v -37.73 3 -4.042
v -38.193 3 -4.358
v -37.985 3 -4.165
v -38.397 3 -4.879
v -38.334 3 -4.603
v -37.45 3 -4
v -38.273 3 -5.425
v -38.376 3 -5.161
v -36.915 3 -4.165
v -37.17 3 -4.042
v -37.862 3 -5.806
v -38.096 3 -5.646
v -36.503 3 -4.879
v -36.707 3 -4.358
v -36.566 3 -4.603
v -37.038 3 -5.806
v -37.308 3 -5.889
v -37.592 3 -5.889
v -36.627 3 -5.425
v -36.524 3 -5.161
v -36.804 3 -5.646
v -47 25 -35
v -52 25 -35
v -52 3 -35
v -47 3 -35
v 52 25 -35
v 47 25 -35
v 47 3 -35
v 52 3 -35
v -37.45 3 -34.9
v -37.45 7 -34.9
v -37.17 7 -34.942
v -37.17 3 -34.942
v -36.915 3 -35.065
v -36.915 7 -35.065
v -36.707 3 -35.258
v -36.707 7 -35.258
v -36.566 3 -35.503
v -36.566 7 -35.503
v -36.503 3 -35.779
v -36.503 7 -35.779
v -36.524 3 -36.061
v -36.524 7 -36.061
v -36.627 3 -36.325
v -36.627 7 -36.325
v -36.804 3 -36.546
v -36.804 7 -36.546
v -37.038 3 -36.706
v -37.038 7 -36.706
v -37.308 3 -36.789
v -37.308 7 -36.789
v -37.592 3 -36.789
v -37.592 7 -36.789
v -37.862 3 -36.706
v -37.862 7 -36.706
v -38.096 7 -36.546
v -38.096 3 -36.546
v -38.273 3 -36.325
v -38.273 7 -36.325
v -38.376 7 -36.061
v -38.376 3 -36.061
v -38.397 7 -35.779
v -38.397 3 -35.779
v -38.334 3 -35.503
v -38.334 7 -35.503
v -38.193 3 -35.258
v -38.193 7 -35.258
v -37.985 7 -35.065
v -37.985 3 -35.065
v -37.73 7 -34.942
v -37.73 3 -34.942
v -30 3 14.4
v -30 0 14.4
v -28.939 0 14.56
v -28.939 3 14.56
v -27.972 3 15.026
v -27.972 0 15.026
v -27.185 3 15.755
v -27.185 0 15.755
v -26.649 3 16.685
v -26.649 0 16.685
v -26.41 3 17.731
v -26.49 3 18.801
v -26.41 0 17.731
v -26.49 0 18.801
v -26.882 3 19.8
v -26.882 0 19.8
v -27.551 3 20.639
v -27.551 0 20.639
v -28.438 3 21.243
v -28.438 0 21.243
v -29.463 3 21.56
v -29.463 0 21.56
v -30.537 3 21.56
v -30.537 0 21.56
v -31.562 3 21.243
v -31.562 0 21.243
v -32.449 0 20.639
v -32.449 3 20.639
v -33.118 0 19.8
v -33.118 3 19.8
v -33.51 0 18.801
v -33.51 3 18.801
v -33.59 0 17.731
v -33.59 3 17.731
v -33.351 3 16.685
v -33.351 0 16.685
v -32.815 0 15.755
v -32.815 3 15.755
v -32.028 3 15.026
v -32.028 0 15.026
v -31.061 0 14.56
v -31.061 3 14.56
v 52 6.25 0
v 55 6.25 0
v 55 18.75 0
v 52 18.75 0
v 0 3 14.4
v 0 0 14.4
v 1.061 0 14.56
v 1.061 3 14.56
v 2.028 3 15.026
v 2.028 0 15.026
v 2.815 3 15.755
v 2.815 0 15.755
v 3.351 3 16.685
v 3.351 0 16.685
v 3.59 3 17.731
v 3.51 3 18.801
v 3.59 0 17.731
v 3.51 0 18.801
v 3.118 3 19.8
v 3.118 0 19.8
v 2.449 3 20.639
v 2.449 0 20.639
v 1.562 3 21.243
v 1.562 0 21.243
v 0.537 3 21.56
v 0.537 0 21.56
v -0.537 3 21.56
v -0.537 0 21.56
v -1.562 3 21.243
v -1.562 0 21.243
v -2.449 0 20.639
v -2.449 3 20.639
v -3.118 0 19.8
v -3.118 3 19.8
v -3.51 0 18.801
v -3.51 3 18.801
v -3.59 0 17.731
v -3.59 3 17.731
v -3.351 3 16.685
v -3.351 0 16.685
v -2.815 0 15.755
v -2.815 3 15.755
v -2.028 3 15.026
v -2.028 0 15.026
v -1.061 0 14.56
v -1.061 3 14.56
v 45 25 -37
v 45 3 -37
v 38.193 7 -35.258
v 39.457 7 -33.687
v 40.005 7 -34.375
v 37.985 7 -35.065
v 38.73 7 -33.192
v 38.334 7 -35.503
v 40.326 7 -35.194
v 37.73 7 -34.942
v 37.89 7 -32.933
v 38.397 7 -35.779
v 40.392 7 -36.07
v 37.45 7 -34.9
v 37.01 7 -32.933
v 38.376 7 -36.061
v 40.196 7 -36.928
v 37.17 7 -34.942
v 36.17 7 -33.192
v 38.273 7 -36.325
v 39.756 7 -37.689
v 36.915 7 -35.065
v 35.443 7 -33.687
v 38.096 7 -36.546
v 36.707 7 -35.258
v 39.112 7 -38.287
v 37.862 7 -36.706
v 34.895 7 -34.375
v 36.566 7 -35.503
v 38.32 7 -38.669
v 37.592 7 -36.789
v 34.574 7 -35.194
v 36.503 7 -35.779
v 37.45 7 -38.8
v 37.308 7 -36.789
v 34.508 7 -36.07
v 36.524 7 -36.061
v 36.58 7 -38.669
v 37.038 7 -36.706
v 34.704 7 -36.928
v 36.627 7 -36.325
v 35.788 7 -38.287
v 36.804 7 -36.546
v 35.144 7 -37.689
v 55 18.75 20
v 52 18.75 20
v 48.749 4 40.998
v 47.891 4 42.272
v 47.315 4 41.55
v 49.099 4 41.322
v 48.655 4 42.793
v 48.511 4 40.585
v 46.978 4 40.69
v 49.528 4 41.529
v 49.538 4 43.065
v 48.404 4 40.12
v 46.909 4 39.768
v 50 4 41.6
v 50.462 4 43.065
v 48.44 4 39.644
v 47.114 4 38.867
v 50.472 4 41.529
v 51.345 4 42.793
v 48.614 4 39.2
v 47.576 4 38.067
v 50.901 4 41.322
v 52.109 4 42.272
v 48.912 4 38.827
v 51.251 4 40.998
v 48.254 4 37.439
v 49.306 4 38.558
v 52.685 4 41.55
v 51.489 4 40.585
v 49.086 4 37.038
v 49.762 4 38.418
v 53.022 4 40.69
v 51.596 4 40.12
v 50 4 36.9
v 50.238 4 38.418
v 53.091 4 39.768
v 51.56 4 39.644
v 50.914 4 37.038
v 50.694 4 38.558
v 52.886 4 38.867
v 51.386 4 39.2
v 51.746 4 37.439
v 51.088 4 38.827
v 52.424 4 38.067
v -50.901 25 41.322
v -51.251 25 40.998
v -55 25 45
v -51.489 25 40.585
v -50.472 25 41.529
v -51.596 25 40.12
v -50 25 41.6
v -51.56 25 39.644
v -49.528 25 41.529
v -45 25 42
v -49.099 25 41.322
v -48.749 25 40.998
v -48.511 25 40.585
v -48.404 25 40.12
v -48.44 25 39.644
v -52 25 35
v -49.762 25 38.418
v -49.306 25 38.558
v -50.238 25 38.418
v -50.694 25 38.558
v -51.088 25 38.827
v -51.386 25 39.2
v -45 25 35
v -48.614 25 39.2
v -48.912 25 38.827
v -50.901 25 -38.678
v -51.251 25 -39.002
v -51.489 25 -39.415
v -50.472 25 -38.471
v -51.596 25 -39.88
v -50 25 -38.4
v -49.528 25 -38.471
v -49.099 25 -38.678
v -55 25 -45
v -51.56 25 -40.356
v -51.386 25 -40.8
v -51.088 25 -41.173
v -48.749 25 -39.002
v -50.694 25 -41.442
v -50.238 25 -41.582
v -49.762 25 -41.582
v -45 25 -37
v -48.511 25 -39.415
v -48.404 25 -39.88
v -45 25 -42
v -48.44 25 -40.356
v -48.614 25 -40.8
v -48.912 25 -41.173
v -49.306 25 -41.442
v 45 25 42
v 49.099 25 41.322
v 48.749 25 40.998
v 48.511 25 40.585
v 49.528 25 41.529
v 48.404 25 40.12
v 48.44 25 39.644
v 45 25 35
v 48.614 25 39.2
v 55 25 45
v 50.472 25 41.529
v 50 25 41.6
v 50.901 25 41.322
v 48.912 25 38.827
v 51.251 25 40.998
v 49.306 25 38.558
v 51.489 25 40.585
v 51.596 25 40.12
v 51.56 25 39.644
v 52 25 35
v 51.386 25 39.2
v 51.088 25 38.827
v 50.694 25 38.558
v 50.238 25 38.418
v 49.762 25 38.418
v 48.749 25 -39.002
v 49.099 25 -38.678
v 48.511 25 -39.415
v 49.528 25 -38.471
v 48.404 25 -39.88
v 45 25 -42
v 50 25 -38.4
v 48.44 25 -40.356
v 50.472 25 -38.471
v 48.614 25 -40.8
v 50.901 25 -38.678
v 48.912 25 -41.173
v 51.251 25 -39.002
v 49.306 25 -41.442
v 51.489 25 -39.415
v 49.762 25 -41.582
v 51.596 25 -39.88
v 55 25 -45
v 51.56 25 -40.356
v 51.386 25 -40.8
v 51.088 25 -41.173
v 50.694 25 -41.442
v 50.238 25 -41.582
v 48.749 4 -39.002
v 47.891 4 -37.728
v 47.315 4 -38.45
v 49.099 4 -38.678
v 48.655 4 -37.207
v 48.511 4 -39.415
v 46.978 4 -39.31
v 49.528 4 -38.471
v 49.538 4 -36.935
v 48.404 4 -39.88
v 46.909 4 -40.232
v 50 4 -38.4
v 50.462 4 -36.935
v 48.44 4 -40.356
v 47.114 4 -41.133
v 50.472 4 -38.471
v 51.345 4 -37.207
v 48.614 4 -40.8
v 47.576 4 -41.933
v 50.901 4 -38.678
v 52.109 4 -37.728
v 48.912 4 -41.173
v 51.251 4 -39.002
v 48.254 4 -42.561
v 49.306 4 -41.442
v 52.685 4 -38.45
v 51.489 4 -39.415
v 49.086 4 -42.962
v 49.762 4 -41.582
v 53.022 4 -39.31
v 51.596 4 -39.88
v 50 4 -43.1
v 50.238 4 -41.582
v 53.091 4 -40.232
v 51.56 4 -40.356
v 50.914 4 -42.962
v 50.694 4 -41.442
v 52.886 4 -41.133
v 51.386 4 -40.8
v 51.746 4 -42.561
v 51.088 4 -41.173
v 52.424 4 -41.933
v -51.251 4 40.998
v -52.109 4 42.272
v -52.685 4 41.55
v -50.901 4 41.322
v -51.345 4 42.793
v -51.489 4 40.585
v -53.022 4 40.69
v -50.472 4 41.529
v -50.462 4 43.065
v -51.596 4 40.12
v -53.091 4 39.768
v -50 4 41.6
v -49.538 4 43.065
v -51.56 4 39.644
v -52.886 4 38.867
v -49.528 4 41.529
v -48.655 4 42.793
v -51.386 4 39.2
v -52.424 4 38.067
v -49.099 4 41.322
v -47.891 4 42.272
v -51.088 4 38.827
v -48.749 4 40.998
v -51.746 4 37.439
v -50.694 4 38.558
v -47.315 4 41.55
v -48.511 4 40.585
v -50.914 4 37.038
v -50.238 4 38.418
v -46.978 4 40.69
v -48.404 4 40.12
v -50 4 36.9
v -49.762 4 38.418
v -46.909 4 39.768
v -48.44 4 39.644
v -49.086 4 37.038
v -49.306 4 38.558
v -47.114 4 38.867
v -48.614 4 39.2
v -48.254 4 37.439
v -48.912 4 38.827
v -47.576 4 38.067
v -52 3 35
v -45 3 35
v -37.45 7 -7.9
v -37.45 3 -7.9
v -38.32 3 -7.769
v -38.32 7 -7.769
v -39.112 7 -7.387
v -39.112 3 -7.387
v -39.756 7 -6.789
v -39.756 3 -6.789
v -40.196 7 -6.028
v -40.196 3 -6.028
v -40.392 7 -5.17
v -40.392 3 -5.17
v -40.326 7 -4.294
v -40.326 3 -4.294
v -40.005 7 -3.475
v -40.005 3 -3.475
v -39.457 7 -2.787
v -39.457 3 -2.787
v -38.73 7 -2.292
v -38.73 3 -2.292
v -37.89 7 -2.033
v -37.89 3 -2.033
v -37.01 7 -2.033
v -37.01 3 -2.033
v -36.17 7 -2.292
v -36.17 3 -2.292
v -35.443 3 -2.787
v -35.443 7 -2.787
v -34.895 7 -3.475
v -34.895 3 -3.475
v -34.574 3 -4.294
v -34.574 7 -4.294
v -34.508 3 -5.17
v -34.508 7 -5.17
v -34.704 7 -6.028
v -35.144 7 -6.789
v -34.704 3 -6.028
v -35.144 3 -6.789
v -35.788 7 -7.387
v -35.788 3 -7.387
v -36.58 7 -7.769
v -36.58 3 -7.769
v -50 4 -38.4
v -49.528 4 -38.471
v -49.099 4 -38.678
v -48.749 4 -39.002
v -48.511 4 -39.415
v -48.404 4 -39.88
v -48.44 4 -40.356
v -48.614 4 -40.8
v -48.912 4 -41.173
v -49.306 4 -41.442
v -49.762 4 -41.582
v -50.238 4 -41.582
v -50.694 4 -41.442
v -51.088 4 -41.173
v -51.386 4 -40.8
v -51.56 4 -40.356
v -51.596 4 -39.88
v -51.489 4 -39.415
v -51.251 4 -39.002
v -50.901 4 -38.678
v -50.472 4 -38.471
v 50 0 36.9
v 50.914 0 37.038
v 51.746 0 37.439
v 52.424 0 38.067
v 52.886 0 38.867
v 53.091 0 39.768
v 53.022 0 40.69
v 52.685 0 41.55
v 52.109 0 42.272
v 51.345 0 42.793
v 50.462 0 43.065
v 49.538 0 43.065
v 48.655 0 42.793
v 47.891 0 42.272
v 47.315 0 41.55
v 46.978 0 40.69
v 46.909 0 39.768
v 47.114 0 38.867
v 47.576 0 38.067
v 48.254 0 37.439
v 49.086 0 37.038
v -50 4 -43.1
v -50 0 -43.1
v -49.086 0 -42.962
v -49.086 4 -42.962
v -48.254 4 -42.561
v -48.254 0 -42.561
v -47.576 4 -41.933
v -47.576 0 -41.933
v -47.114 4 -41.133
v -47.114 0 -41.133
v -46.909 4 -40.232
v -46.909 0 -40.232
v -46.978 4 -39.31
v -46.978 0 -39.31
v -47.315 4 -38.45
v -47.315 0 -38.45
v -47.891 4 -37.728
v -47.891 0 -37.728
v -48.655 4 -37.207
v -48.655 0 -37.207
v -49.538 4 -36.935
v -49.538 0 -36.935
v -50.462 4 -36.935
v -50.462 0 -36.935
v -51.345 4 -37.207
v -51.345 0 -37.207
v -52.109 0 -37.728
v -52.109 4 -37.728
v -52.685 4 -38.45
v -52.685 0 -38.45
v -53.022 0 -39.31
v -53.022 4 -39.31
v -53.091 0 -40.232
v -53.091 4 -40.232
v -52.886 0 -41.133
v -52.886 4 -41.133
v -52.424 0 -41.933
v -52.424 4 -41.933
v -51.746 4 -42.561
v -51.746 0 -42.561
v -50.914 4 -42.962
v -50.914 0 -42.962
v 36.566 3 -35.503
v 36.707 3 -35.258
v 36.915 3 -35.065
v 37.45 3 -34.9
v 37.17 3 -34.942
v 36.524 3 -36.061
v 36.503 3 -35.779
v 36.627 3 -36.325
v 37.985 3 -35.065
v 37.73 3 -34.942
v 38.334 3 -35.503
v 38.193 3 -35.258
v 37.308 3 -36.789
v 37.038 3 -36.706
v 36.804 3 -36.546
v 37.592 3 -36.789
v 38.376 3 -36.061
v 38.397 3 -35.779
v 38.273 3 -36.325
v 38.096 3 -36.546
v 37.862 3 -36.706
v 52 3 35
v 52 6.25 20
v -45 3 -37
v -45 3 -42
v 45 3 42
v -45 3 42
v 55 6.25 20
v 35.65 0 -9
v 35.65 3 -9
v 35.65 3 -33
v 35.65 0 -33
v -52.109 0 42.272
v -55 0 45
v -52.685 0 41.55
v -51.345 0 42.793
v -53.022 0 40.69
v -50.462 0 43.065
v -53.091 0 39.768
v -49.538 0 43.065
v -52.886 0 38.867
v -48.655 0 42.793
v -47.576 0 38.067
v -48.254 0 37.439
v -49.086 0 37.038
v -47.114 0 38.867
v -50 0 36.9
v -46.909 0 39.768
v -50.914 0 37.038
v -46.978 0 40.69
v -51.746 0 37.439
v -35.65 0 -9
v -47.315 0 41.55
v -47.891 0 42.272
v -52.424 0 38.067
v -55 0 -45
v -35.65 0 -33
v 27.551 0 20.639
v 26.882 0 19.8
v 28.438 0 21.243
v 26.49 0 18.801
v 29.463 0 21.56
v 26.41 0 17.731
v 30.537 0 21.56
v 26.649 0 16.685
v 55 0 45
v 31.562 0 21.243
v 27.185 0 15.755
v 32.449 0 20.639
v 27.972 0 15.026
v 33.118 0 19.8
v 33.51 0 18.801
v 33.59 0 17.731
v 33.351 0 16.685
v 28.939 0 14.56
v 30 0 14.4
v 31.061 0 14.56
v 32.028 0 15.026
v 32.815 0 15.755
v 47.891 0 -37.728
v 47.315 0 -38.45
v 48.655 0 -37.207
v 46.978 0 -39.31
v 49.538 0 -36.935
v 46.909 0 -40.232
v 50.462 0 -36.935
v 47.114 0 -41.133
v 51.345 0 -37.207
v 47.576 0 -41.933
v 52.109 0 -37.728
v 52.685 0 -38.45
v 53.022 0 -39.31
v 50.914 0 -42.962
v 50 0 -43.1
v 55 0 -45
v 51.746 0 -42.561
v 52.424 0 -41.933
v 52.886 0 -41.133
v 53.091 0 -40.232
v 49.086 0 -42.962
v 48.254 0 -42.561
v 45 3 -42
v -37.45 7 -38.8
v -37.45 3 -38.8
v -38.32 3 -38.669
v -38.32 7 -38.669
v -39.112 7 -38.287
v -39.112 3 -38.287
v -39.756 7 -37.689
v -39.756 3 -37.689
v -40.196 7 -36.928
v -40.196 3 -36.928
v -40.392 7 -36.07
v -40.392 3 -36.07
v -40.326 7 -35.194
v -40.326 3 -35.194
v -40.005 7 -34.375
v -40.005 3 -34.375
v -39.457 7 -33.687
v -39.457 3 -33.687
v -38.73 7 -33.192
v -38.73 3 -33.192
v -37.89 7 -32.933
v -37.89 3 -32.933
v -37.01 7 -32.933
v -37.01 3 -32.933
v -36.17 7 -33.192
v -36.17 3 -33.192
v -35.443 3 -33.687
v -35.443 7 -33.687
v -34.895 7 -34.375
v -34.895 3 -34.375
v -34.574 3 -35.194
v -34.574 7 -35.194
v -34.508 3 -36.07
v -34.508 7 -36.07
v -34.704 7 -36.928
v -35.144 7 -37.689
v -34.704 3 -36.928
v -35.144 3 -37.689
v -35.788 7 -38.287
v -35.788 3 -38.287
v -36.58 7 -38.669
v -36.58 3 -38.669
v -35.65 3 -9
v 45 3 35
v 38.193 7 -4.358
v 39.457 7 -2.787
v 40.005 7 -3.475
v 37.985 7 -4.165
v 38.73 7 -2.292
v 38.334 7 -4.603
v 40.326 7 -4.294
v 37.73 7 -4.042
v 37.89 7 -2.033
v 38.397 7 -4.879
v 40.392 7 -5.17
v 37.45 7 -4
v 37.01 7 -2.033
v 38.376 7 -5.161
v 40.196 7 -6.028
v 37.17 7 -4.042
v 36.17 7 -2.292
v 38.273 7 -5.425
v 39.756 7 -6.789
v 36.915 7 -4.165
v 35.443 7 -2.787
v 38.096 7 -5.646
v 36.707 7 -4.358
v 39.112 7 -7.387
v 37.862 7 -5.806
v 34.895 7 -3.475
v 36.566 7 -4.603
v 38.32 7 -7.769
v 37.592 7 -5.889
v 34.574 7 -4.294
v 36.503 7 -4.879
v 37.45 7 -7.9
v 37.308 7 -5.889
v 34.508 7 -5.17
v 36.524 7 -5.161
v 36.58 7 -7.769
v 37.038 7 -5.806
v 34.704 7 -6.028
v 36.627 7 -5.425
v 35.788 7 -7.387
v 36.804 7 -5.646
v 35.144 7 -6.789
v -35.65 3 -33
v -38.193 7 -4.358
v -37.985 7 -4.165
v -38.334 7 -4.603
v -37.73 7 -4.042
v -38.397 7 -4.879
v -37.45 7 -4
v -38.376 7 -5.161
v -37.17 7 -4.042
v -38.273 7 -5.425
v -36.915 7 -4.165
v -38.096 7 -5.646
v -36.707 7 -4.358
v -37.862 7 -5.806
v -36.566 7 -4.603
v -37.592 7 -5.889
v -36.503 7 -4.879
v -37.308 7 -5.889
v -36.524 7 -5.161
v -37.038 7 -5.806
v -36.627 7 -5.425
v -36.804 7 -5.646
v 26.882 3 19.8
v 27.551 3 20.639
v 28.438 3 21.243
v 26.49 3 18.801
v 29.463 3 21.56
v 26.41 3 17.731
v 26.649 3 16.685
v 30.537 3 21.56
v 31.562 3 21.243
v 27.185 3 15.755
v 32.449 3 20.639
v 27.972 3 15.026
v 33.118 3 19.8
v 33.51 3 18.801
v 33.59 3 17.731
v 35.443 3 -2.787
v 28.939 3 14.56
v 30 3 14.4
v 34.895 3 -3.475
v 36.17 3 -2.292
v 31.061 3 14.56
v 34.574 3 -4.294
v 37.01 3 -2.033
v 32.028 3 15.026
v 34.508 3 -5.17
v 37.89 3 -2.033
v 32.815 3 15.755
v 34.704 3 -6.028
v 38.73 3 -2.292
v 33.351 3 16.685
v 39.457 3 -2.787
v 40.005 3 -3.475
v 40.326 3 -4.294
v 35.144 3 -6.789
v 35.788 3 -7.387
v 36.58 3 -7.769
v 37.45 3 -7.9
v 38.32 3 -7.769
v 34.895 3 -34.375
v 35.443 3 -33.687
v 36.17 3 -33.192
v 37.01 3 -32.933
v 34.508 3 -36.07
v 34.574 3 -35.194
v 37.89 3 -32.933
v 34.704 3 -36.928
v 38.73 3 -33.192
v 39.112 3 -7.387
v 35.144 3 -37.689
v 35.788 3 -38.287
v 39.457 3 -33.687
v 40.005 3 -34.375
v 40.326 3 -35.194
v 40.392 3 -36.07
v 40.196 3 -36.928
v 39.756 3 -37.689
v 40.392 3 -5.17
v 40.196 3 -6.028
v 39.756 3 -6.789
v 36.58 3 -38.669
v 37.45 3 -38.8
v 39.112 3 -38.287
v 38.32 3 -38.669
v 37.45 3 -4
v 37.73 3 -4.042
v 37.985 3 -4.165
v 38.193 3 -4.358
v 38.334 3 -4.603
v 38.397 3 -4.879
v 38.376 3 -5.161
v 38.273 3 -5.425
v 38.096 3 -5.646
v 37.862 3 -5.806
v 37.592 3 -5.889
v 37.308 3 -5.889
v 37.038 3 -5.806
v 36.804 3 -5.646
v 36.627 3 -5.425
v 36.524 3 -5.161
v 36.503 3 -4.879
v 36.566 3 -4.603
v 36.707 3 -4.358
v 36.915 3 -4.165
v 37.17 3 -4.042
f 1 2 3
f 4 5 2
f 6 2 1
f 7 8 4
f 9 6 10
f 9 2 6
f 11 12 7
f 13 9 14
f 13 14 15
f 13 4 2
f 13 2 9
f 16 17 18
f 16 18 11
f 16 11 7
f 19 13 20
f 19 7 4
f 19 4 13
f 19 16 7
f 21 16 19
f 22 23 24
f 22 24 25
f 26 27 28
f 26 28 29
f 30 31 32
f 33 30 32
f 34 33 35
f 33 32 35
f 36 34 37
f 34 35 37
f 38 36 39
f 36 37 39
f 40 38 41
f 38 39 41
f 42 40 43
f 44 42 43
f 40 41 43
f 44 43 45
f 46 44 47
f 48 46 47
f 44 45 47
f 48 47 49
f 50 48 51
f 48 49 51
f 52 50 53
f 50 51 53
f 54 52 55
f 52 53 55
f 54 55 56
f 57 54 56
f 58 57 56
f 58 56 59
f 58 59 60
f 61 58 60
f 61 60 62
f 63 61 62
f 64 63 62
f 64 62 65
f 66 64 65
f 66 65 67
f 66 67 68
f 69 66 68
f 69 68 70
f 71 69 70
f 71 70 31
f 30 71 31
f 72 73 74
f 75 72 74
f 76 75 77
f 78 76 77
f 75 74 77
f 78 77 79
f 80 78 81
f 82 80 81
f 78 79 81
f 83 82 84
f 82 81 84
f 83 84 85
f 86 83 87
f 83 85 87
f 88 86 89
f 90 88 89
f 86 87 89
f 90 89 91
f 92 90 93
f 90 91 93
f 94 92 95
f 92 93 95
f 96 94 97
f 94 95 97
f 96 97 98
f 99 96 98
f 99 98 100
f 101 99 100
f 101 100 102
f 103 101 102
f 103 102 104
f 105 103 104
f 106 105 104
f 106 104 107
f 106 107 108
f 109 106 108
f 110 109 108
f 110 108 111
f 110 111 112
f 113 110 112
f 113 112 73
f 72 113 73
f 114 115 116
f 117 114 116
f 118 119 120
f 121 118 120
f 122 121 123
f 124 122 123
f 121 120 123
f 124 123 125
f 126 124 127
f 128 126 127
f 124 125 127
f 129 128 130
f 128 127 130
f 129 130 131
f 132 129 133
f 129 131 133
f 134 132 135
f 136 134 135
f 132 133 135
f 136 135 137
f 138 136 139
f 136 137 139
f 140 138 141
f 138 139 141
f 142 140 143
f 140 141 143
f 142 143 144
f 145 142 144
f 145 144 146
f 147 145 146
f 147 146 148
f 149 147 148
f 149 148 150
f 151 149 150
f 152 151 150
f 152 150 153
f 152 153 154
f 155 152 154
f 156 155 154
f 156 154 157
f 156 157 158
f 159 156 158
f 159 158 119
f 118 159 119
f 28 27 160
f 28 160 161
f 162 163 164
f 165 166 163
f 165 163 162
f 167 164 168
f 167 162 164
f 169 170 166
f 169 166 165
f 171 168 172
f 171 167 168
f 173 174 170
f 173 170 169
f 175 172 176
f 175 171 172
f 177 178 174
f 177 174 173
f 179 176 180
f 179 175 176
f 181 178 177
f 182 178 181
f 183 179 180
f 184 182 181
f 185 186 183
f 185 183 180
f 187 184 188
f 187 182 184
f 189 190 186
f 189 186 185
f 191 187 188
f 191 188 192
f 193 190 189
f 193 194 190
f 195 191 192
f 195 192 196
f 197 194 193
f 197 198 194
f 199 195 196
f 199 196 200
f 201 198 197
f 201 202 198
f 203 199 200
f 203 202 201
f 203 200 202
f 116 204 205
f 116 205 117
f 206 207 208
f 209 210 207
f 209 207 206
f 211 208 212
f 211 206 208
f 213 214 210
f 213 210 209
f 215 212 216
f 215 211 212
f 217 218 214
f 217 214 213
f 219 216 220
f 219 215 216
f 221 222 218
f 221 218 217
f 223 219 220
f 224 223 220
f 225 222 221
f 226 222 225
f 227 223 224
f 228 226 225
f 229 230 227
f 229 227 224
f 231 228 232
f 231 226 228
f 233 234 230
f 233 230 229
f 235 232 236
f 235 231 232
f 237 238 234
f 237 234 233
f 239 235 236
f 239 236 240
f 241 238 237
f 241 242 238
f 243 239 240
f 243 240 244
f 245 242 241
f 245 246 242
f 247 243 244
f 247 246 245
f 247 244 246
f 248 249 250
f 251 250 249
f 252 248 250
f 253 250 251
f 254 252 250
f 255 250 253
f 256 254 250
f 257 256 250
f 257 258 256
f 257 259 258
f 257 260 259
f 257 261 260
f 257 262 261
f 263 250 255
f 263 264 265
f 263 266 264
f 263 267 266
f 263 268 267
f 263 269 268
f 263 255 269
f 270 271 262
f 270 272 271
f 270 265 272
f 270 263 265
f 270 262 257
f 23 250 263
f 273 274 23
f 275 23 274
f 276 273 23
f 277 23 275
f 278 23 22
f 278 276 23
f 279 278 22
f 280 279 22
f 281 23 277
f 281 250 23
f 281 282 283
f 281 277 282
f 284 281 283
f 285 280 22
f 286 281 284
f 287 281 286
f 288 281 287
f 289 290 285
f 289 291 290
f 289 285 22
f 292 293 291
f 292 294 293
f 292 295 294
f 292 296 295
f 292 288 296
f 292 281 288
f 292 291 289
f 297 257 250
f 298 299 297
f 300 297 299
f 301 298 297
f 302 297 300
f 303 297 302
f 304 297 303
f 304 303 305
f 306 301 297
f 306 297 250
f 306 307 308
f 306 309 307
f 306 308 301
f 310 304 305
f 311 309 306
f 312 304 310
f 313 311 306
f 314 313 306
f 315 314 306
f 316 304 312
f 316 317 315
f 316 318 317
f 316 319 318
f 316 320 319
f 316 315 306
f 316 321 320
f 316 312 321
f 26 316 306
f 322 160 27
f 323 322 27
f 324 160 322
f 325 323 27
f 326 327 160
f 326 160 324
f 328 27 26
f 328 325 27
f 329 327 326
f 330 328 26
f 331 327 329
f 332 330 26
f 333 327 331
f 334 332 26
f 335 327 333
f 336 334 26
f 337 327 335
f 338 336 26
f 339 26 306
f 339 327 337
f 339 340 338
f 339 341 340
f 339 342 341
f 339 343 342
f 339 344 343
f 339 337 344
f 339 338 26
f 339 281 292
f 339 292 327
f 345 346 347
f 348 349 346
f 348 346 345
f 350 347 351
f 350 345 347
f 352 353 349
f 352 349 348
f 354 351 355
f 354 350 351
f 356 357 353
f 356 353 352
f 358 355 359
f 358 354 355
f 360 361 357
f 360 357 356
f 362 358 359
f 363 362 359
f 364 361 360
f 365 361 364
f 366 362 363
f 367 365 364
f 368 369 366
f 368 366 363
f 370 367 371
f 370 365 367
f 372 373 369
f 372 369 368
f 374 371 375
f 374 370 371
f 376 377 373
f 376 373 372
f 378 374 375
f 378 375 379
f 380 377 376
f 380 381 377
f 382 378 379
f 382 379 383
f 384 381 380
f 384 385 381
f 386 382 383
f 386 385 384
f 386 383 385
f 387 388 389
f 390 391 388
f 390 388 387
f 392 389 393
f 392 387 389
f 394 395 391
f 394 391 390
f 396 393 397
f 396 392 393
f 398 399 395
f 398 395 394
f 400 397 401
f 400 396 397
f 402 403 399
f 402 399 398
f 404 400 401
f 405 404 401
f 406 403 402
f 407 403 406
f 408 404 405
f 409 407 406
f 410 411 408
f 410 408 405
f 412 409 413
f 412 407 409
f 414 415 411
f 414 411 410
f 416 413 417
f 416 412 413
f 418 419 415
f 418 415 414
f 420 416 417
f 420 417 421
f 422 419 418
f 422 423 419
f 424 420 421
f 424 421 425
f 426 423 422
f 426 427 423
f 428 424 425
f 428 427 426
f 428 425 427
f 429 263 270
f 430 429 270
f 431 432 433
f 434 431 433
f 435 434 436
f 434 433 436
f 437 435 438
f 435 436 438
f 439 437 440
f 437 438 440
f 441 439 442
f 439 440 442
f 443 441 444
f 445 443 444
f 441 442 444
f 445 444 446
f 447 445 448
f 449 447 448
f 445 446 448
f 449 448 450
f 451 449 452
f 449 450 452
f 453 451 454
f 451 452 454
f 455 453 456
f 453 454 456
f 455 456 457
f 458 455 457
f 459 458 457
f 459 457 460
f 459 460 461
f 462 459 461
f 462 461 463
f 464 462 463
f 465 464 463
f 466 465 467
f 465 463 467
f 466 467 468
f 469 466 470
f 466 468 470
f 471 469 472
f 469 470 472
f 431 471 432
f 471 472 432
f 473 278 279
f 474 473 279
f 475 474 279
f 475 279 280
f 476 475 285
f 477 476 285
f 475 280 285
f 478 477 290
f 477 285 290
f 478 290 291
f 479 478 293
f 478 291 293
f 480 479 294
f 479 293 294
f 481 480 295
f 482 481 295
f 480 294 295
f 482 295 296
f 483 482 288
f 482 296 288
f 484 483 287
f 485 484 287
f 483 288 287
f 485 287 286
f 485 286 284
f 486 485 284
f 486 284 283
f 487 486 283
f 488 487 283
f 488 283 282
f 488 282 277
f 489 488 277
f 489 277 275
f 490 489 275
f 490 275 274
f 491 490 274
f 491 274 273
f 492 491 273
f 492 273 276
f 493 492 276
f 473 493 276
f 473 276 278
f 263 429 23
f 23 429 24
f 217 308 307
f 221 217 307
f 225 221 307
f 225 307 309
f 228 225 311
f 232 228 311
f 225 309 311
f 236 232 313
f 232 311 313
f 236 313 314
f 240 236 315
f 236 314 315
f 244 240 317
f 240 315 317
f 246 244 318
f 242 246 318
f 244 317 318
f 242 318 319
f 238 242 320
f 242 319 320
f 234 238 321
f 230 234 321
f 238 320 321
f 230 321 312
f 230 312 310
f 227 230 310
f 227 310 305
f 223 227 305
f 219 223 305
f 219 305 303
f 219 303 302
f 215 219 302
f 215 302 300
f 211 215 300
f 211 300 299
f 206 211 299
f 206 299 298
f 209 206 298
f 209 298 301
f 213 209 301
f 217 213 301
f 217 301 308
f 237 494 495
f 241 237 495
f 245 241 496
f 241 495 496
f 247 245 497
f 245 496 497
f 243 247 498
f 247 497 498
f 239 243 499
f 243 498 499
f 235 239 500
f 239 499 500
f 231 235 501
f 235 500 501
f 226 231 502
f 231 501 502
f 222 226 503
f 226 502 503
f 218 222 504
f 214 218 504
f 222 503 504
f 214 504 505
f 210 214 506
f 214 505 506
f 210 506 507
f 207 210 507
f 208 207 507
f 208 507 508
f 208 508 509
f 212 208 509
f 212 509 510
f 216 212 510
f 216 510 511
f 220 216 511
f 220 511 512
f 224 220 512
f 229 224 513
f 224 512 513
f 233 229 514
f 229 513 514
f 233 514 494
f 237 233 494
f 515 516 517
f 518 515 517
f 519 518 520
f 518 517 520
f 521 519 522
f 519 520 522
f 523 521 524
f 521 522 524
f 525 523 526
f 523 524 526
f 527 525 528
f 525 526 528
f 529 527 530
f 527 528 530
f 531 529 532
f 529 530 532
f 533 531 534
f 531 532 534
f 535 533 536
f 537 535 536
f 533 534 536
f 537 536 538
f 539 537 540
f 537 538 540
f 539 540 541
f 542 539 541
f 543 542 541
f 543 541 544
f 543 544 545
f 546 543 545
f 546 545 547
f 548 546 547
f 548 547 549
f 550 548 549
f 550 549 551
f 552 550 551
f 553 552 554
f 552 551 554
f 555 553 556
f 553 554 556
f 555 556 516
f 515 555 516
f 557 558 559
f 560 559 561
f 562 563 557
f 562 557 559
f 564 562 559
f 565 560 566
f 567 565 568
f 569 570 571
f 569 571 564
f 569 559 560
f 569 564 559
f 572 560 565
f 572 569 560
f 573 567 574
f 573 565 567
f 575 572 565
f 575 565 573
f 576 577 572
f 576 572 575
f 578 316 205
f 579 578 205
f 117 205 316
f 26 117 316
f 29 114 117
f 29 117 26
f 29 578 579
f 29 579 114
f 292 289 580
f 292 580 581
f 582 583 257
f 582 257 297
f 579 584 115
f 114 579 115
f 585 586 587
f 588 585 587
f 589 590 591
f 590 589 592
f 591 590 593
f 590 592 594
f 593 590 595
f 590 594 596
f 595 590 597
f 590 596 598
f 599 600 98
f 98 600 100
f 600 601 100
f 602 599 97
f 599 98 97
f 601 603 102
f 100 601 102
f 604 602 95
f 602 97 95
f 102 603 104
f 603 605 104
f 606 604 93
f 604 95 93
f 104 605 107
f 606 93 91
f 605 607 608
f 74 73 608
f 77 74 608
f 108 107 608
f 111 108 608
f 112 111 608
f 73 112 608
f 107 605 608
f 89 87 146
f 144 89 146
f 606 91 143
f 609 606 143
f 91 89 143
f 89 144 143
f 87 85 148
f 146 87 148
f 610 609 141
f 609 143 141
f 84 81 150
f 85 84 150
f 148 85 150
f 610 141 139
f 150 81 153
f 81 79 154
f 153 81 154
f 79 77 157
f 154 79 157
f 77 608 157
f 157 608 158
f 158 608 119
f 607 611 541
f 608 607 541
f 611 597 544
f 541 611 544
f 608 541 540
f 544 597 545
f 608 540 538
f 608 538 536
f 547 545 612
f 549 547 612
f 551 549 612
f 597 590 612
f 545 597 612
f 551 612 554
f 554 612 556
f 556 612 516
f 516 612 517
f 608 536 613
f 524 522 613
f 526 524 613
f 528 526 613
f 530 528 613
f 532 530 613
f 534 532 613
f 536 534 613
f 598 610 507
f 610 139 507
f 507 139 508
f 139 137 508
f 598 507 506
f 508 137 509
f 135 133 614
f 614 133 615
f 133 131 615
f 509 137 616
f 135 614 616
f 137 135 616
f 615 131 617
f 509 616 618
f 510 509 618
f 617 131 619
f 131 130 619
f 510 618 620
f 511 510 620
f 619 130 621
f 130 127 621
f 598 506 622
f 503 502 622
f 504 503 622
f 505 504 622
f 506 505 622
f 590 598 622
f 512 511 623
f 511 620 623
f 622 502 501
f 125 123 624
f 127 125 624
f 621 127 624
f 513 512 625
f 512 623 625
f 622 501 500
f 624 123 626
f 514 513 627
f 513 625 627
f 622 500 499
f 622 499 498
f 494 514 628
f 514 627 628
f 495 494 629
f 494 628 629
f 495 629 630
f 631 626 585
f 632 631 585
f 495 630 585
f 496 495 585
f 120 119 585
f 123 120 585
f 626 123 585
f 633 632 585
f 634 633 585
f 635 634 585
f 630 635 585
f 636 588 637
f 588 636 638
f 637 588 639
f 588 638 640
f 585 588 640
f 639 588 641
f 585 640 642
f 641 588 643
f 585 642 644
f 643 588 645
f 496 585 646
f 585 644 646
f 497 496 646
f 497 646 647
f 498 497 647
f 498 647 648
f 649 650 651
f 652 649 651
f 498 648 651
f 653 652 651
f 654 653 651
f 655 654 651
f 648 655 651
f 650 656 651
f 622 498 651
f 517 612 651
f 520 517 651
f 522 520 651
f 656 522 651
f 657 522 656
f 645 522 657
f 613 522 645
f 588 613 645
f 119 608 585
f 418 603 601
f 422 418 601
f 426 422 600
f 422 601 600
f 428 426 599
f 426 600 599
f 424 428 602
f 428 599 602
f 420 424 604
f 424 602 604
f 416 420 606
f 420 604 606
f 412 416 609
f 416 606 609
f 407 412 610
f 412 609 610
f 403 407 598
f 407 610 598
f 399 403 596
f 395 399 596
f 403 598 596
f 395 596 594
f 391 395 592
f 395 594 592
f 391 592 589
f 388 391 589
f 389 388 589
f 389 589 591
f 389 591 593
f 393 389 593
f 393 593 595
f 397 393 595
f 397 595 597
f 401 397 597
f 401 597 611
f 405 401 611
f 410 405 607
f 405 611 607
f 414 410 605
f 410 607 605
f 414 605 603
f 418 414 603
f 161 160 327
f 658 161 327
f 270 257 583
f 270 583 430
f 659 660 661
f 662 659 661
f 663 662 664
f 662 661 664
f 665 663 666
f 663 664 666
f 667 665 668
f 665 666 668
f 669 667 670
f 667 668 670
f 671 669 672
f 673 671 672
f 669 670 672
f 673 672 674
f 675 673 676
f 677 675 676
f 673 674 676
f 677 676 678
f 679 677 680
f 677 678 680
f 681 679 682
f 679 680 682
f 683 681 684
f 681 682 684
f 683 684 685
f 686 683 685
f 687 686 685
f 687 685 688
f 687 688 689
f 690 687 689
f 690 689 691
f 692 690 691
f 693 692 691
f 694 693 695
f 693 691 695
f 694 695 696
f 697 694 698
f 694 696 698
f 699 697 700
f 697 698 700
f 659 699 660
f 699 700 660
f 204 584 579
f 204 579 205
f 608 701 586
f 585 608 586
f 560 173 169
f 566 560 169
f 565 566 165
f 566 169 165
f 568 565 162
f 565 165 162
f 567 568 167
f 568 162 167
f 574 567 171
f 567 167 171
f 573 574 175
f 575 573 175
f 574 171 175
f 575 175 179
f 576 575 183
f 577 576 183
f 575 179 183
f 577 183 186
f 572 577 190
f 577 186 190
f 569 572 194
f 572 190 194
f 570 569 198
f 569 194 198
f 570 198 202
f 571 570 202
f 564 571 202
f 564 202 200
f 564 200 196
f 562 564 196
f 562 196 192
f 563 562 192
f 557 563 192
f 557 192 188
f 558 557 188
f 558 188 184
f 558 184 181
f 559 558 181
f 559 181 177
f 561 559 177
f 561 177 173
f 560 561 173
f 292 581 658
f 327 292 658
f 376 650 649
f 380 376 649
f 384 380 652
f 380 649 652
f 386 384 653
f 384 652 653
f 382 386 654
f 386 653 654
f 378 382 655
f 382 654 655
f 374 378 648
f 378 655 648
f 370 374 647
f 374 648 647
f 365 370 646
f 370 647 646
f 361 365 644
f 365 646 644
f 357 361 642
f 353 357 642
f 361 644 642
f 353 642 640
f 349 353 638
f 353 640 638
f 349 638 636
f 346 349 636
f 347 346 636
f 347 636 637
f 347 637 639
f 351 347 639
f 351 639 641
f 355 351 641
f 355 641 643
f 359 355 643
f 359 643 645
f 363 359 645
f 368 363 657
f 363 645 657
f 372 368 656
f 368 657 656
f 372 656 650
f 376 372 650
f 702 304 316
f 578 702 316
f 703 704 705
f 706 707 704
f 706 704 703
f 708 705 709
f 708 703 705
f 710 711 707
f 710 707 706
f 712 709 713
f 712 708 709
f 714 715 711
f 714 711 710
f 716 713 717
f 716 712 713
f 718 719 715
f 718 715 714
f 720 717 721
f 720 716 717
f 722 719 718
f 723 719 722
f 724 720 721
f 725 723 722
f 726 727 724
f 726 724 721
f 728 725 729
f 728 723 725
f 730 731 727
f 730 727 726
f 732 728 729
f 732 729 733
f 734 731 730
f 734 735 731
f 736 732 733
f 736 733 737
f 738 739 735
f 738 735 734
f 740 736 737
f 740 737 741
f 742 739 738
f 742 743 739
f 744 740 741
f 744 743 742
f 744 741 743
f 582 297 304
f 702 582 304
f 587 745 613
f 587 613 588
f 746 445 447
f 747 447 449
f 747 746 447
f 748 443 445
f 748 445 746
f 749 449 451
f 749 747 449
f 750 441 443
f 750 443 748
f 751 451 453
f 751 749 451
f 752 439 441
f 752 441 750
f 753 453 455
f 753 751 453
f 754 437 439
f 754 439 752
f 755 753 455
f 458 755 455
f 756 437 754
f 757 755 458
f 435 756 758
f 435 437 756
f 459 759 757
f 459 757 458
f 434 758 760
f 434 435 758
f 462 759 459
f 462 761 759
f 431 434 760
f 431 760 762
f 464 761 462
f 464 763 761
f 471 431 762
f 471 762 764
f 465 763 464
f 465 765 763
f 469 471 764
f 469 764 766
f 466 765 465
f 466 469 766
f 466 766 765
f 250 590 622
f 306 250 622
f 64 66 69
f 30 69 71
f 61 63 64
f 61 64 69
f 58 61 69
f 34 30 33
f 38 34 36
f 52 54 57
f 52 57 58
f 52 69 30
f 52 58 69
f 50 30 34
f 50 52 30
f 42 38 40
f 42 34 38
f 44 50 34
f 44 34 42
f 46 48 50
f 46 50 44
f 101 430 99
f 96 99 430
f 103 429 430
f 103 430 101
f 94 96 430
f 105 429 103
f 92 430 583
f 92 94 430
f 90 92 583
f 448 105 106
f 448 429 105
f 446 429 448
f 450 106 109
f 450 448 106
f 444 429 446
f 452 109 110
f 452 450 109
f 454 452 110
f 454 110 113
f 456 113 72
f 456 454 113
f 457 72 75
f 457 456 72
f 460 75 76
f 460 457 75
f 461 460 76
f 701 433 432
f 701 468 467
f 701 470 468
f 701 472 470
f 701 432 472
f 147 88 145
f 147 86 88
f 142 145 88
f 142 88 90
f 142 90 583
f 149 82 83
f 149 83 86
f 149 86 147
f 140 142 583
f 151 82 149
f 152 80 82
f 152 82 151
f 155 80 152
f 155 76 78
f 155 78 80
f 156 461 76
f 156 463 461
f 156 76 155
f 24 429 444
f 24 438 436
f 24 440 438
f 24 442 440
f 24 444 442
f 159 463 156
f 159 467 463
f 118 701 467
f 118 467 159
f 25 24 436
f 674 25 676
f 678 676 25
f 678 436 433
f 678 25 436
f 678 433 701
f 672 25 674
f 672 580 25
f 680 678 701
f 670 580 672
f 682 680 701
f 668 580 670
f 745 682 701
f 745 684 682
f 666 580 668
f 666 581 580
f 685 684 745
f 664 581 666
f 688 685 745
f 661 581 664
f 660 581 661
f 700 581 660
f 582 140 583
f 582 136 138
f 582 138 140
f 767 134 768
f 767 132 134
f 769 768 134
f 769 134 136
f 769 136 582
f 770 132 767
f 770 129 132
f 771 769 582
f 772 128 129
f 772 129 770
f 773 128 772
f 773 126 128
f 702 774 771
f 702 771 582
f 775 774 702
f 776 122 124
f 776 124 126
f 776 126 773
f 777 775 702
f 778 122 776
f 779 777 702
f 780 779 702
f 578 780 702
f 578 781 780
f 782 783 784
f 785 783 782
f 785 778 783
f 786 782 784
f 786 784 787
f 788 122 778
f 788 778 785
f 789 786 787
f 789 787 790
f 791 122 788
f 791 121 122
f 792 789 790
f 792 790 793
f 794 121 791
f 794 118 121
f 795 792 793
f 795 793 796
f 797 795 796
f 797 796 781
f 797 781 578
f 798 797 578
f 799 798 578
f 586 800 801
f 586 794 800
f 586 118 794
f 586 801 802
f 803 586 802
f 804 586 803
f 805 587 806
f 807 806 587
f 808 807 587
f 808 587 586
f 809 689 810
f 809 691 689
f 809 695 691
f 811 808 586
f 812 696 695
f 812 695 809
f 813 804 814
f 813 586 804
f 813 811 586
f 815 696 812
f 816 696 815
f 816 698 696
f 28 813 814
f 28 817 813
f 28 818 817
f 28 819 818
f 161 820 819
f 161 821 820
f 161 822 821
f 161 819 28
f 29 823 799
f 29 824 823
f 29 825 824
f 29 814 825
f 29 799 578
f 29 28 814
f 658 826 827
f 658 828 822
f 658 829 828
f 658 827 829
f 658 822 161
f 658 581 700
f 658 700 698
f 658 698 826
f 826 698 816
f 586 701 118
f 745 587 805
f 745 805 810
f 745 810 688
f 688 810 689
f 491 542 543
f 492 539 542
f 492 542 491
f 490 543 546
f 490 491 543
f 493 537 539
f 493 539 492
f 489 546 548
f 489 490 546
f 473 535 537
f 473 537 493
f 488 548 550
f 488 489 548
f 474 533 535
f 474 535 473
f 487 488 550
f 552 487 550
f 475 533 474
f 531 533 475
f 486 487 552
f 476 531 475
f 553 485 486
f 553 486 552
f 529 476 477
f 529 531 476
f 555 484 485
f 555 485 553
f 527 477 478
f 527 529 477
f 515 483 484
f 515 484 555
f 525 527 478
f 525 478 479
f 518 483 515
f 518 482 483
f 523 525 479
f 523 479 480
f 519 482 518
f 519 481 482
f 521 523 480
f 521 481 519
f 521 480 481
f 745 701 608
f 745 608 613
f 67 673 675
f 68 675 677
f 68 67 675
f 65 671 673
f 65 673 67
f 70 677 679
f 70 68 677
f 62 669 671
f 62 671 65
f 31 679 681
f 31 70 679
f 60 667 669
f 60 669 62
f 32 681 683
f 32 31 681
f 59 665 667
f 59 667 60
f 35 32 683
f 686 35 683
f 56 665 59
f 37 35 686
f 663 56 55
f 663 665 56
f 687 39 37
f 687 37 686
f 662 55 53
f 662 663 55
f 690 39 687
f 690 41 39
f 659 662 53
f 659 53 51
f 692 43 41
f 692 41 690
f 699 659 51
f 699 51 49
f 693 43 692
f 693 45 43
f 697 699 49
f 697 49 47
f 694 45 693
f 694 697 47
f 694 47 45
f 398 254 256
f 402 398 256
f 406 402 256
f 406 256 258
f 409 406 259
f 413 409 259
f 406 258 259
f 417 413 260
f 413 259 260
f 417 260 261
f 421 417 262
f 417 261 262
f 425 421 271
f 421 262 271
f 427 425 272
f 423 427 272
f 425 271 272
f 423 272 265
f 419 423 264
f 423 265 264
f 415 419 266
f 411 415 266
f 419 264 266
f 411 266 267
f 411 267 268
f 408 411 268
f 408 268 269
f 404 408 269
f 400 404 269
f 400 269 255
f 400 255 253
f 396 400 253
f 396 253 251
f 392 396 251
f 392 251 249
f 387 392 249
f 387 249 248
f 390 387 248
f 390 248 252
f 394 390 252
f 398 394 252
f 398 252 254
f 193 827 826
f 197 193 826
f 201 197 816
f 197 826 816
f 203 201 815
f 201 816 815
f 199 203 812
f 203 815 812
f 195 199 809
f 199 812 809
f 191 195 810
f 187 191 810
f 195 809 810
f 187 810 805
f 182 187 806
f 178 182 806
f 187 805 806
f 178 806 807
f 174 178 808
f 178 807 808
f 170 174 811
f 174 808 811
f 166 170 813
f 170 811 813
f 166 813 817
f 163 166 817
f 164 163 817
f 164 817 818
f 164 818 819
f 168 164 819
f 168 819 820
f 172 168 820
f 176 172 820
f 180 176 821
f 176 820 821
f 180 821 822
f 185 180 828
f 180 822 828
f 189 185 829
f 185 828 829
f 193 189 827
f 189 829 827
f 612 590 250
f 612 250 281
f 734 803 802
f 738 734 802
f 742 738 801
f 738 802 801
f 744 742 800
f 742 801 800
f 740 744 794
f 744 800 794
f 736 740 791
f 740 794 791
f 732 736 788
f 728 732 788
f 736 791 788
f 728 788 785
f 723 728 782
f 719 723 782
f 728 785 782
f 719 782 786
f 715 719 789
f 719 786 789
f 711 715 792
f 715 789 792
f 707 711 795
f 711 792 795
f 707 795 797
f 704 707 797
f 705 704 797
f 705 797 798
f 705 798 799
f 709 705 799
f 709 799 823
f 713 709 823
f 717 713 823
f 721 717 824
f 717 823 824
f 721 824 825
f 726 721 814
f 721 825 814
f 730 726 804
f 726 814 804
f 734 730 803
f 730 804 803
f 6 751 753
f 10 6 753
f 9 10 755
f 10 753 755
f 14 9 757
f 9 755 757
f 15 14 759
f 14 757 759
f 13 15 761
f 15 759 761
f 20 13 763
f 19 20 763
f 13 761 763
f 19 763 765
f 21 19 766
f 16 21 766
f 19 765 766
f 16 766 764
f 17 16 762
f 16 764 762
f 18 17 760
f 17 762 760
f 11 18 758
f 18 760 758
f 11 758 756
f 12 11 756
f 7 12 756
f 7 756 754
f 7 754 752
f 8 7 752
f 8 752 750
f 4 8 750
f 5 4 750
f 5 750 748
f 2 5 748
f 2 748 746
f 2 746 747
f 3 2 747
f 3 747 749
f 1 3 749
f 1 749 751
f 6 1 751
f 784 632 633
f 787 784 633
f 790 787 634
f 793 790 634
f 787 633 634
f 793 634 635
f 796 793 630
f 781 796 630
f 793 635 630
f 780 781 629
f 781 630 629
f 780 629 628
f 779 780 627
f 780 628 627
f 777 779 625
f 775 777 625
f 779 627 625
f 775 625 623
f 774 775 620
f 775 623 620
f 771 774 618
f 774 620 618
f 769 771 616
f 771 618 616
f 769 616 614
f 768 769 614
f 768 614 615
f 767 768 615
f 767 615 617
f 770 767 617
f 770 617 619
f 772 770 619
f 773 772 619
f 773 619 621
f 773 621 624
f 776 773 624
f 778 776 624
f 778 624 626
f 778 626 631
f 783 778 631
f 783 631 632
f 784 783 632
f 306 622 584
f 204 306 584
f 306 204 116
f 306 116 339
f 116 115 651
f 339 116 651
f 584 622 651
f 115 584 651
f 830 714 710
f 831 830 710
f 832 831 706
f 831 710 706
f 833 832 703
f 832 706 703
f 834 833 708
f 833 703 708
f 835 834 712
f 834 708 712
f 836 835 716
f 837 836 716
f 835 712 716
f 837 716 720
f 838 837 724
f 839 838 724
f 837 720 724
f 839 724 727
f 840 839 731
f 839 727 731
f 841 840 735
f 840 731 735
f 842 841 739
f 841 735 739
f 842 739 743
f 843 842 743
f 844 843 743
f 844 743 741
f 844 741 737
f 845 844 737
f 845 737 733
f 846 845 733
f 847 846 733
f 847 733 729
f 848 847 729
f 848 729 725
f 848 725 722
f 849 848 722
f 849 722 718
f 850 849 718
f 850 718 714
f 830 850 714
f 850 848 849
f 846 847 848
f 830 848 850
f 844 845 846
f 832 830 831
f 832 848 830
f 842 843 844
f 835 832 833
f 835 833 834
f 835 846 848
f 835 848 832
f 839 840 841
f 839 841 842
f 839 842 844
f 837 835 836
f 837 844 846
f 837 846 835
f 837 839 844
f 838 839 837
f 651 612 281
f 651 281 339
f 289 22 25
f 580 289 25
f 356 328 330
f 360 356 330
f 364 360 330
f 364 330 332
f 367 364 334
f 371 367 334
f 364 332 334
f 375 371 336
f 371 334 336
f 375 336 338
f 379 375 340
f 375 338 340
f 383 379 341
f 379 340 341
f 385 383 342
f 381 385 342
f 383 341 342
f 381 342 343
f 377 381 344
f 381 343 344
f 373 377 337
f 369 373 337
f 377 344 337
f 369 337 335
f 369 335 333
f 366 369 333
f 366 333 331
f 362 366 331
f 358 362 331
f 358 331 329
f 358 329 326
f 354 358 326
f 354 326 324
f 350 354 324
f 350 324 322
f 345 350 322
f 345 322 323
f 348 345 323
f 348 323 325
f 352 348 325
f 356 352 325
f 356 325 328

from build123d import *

# Parameters (mm, degrees)
CROQUIS1_W              = 110
CROQUIS1_H              = 90
SALIENTE_EXTRUIR1_DEPTH = 25
VACIADO1_T              = -3
CROQUIS2_W              = 71.3
CROQUIS2_H              = 24
CORTAR_EXTRUIR1_DEPTH   = 75.390859654
CROQUIS4_R              = 2.95
CROQUIS4_R_2            = 1.45
SALIENTE_EXTRUIR2_DEPTH = 4
SALIENTE_EXTRUIR3_REACH = 75.308
CROQUIS5_R              = 1.45
CROQUIS5_R_2            = 0.95
MATRIZL1_COUNT          = 2
MATRIZL1_PITCH          = 74.9
MATRIZL1_COUNT_DIR2     = 2
MATRIZL1_PITCH_DIR2     = 30.9
SALIENTE_EXTRUIR4_REACH = 77.333
CROQUIS6_W              = 10
CROQUIS6_H              = 10
CROQUIS7_R              = 1.6
CORTAR_EXTRUIR2_DEPTH   = 76.332595867
CROQUIS8_R              = 3.1
CORTAR_EXTRUIR3_DEPTH   = 4
CHAFL_N1_SIZE           = 2
CROQUIS10_R             = 3.6
CORTAR_EXTRUIR5_DEPTH   = 76.332595867
CROQUIS11_W             = 20
CROQUIS11_H             = 12.5
CORTAR_EXTRUIR6_DEPTH   = 10


with BuildPart() as part:
    # Croquis1 → Saliente-Extruir1 (new body)
    with BuildSketch(Plane(origin=(0, 0, 0), x_dir=(1, 0, 0), z_dir=(0, 1, 0))):
        Rectangle(CROQUIS1_W, CROQUIS1_H)
    extrude(amount=SALIENTE_EXTRUIR1_DEPTH)

    # Vaciado1
    vaciado1_openings = [part.faces().sort_by_distance(p)[0] for p in [
        (0, 25, 0),
    ]]
    offset(amount=VACIADO1_T, openings=vaciado1_openings, kind=Kind.INTERSECTION)

    # Croquis2 → Cortar-Extruir1 (cut, through all)
    with BuildSketch(Plane(origin=(0, 3, 0), x_dir=(1, 0, 0), z_dir=(0, 1, 0))):
        with Locations((0, 21)):
            Rectangle(CROQUIS2_W, CROQUIS2_H)
    extrude(amount=-CORTAR_EXTRUIR1_DEPTH, mode=Mode.SUBTRACT)

    # Croquis4 → Saliente-Extruir2 (add)
    # profile 1 of 4: a face of its own
    with BuildSketch(Plane(origin=(0, 3, 0), x_dir=(1, 0, 0), z_dir=(0, 1, 0))):
        with Locations(Location((-37.45, 35.85, 0), (0, 0, 90))):
            Circle(CROQUIS4_R)
        with Locations(Location((-37.45, 35.85, 0), (0, 0, 270))):
            Circle(CROQUIS4_R_2, mode=Mode.SUBTRACT)
    # profile 2 of 4: a face of its own
    with BuildSketch(Plane(origin=(0, 3, 0), x_dir=(1, 0, 0), z_dir=(0, 1, 0))):
        with Locations(Location((-37.45, 4.95, 0), (0, 0, 90))):
            Circle(CROQUIS4_R)
        with Locations(Location((-37.45, 4.95, 0), (0, 0, 270))):
            Circle(CROQUIS4_R_2, mode=Mode.SUBTRACT)
    # profile 3 of 4: a face of its own
    with BuildSketch(Plane(origin=(0, 3, 0), x_dir=(1, 0, 0), z_dir=(0, 1, 0))):
        with Locations(Location((37.45, 35.85, 0), (0, 0, 90))):
            Circle(CROQUIS4_R)
        with Locations(Location((37.45, 35.85, 0), (0, 0, 270))):
            Circle(CROQUIS4_R_2, mode=Mode.SUBTRACT)
    # profile 4 of 4: a face of its own
    with BuildSketch(Plane(origin=(0, 3, 0), x_dir=(1, 0, 0), z_dir=(0, 1, 0))):
        with Locations(Location((37.45, 4.95, 0), (0, 0, 90))):
            Circle(CROQUIS4_R)
        with Locations(Location((37.45, 4.95, 0), (0, 0, 270))):
            Circle(CROQUIS4_R_2, mode=Mode.SUBTRACT)
    extrude(amount=SALIENTE_EXTRUIR2_DEPTH)

    # Croquis5 → Saliente-Extruir3 (add, up to next)
    with BuildSketch(Plane(origin=(0, 7, 0), x_dir=(1, 0, 0), z_dir=(0, 1, 0)), mode=Mode.PRIVATE) as saliente_extruir3_sk1:
        with Locations((-37.45, 35.85)):
            Circle(CROQUIS5_R)
        with Locations(Location((-37.45, 35.85, 0), (0, 0, 270))):
            Circle(CROQUIS5_R_2, mode=Mode.SUBTRACT)
    saliente_extruir3_tool1 = extrude(saliente_extruir3_sk1.sketch, amount=-SALIENTE_EXTRUIR3_REACH, mode=Mode.PRIVATE) - part.part
    saliente_extruir3 = saliente_extruir3_tool1.solids().sort_by_distance((-38.858988, 7, -35.85))[0]
    add(saliente_extruir3)

    # MatrizL1: Saliente-Extruir3 2 × 2
    with Locations(*[(i * MATRIZL1_PITCH, 0, j * MATRIZL1_PITCH_DIR2) for i in range(MATRIZL1_COUNT) for j in range(MATRIZL1_COUNT_DIR2) if (i, j) != (0, 0)]):
        add(saliente_extruir3)

    # Croquis6 → Saliente-Extruir4 (add, up to next)
    with BuildSketch(Plane(origin=(0, 25, 0), x_dir=(1, 0, 0), z_dir=(0, 1, 0)), mode=Mode.PRIVATE) as saliente_extruir4_sk1:
        with Locations((-50, 40)):
            Rectangle(CROQUIS6_W, CROQUIS6_H)
    saliente_extruir4_tool1 = extrude(saliente_extruir4_sk1.sketch, amount=-SALIENTE_EXTRUIR4_REACH, mode=Mode.PRIVATE) - part.part
    # Croquis6 → Saliente-Extruir4 (add, up to next)
    with BuildSketch(Plane(origin=(0, 25, 0), x_dir=(1, 0, 0), z_dir=(0, 1, 0)), mode=Mode.PRIVATE) as saliente_extruir4_sk2:
        with Locations((-50, -40)):
            Rectangle(CROQUIS6_W, CROQUIS6_H)
    saliente_extruir4_tool2 = extrude(saliente_extruir4_sk2.sketch, amount=-SALIENTE_EXTRUIR4_REACH, mode=Mode.PRIVATE) - part.part
    # Croquis6 → Saliente-Extruir4 (add, up to next)
    with BuildSketch(Plane(origin=(0, 25, 0), x_dir=(1, 0, 0), z_dir=(0, 1, 0)), mode=Mode.PRIVATE) as saliente_extruir4_sk3:
        with Locations((50, -40)):
            Rectangle(CROQUIS6_W, CROQUIS6_H)
    saliente_extruir4_tool3 = extrude(saliente_extruir4_sk3.sketch, amount=-SALIENTE_EXTRUIR4_REACH, mode=Mode.PRIVATE) - part.part
    # Croquis6 → Saliente-Extruir4 (add, up to next)
    with BuildSketch(Plane(origin=(0, 25, 0), x_dir=(1, 0, 0), z_dir=(0, 1, 0)), mode=Mode.PRIVATE) as saliente_extruir4_sk4:
        with Locations((50, 40)):
            Rectangle(CROQUIS6_W, CROQUIS6_H)
    saliente_extruir4_tool4 = extrude(saliente_extruir4_sk4.sketch, amount=-SALIENTE_EXTRUIR4_REACH, mode=Mode.PRIVATE) - part.part
    add(saliente_extruir4_tool1.solids().sort_by_distance((-50, 25, -40))[0])
    add(saliente_extruir4_tool2.solids().sort_by_distance((-50, 25, 40))[0])
    add(saliente_extruir4_tool3.solids().sort_by_distance((50, 25, 40))[0])
    add(saliente_extruir4_tool4.solids().sort_by_distance((50, 25, -40))[0])

    # Croquis7 → Cortar-Extruir2 (cut, through all)
    with BuildSketch(Plane(origin=(0, 25, 0), x_dir=(1, 0, 0), z_dir=(0, 1, 0))):
        with Locations(Location((-50, -40, 0), (0, 0, 270))):
            Circle(CROQUIS7_R)
        with Locations(Location((50, -40, 0), (0, 0, 270))):
            Circle(CROQUIS7_R)
        with Locations(Location((50, 40, 0), (0, 0, 270))):
            Circle(CROQUIS7_R)
        with Locations(Location((-50, 40, 0), (0, 0, 270))):
            Circle(CROQUIS7_R)
    extrude(amount=-CORTAR_EXTRUIR2_DEPTH, mode=Mode.SUBTRACT)

    # Croquis8 → Cortar-Extruir3 (cut)
    with BuildSketch(Plane.XZ):
        with Locations(Location((50, -40, 0), (0, 0, 270))):
            Circle(CROQUIS8_R)
        with Locations(Location((-50, -40, 0), (0, 0, 270))):
            Circle(CROQUIS8_R)
        with Locations(Location((-50, 40, 0), (0, 0, 270))):
            Circle(CROQUIS8_R)
        with Locations(Location((50, 40, 0), (0, 0, 270))):
            Circle(CROQUIS8_R)
    extrude(amount=-CORTAR_EXTRUIR3_DEPTH, mode=Mode.SUBTRACT)

    # Chaflán1
    chafl_n1_edges = [part.edges().sort_by_distance(p)[0] for p in [
        (-45, 14, -35),
        (45, 14, -35),
    ]]
    chamfer(chafl_n1_edges, length=CHAFL_N1_SIZE)

    # Croquis10 → Cortar-Extruir5 (cut, through all)
    with BuildSketch(Plane.XZ):
        with Locations(Location((0, 18, 0), (0, 0, 270))):
            Circle(CROQUIS10_R)
        with Locations(Location((30, 18, 0), (0, 0, 270))):
            Circle(CROQUIS10_R)
        with Locations(Location((-30, 18, 0), (0, 0, 270))):
            Circle(CROQUIS10_R)
    extrude(amount=-CORTAR_EXTRUIR5_DEPTH, mode=Mode.SUBTRACT)

    # Croquis11 → Cortar-Extruir6 (cut)
    with BuildSketch(Plane(origin=(55, 0, 0), x_dir=(0, 0, -1), z_dir=(1, 0, 0))):
        with Locations((-10, 12.5)):
            Rectangle(CROQUIS11_W, CROQUIS11_H)
    extrude(amount=-CORTAR_EXTRUIR6_DEPTH, mode=Mode.SUBTRACT)


solid = part.part
